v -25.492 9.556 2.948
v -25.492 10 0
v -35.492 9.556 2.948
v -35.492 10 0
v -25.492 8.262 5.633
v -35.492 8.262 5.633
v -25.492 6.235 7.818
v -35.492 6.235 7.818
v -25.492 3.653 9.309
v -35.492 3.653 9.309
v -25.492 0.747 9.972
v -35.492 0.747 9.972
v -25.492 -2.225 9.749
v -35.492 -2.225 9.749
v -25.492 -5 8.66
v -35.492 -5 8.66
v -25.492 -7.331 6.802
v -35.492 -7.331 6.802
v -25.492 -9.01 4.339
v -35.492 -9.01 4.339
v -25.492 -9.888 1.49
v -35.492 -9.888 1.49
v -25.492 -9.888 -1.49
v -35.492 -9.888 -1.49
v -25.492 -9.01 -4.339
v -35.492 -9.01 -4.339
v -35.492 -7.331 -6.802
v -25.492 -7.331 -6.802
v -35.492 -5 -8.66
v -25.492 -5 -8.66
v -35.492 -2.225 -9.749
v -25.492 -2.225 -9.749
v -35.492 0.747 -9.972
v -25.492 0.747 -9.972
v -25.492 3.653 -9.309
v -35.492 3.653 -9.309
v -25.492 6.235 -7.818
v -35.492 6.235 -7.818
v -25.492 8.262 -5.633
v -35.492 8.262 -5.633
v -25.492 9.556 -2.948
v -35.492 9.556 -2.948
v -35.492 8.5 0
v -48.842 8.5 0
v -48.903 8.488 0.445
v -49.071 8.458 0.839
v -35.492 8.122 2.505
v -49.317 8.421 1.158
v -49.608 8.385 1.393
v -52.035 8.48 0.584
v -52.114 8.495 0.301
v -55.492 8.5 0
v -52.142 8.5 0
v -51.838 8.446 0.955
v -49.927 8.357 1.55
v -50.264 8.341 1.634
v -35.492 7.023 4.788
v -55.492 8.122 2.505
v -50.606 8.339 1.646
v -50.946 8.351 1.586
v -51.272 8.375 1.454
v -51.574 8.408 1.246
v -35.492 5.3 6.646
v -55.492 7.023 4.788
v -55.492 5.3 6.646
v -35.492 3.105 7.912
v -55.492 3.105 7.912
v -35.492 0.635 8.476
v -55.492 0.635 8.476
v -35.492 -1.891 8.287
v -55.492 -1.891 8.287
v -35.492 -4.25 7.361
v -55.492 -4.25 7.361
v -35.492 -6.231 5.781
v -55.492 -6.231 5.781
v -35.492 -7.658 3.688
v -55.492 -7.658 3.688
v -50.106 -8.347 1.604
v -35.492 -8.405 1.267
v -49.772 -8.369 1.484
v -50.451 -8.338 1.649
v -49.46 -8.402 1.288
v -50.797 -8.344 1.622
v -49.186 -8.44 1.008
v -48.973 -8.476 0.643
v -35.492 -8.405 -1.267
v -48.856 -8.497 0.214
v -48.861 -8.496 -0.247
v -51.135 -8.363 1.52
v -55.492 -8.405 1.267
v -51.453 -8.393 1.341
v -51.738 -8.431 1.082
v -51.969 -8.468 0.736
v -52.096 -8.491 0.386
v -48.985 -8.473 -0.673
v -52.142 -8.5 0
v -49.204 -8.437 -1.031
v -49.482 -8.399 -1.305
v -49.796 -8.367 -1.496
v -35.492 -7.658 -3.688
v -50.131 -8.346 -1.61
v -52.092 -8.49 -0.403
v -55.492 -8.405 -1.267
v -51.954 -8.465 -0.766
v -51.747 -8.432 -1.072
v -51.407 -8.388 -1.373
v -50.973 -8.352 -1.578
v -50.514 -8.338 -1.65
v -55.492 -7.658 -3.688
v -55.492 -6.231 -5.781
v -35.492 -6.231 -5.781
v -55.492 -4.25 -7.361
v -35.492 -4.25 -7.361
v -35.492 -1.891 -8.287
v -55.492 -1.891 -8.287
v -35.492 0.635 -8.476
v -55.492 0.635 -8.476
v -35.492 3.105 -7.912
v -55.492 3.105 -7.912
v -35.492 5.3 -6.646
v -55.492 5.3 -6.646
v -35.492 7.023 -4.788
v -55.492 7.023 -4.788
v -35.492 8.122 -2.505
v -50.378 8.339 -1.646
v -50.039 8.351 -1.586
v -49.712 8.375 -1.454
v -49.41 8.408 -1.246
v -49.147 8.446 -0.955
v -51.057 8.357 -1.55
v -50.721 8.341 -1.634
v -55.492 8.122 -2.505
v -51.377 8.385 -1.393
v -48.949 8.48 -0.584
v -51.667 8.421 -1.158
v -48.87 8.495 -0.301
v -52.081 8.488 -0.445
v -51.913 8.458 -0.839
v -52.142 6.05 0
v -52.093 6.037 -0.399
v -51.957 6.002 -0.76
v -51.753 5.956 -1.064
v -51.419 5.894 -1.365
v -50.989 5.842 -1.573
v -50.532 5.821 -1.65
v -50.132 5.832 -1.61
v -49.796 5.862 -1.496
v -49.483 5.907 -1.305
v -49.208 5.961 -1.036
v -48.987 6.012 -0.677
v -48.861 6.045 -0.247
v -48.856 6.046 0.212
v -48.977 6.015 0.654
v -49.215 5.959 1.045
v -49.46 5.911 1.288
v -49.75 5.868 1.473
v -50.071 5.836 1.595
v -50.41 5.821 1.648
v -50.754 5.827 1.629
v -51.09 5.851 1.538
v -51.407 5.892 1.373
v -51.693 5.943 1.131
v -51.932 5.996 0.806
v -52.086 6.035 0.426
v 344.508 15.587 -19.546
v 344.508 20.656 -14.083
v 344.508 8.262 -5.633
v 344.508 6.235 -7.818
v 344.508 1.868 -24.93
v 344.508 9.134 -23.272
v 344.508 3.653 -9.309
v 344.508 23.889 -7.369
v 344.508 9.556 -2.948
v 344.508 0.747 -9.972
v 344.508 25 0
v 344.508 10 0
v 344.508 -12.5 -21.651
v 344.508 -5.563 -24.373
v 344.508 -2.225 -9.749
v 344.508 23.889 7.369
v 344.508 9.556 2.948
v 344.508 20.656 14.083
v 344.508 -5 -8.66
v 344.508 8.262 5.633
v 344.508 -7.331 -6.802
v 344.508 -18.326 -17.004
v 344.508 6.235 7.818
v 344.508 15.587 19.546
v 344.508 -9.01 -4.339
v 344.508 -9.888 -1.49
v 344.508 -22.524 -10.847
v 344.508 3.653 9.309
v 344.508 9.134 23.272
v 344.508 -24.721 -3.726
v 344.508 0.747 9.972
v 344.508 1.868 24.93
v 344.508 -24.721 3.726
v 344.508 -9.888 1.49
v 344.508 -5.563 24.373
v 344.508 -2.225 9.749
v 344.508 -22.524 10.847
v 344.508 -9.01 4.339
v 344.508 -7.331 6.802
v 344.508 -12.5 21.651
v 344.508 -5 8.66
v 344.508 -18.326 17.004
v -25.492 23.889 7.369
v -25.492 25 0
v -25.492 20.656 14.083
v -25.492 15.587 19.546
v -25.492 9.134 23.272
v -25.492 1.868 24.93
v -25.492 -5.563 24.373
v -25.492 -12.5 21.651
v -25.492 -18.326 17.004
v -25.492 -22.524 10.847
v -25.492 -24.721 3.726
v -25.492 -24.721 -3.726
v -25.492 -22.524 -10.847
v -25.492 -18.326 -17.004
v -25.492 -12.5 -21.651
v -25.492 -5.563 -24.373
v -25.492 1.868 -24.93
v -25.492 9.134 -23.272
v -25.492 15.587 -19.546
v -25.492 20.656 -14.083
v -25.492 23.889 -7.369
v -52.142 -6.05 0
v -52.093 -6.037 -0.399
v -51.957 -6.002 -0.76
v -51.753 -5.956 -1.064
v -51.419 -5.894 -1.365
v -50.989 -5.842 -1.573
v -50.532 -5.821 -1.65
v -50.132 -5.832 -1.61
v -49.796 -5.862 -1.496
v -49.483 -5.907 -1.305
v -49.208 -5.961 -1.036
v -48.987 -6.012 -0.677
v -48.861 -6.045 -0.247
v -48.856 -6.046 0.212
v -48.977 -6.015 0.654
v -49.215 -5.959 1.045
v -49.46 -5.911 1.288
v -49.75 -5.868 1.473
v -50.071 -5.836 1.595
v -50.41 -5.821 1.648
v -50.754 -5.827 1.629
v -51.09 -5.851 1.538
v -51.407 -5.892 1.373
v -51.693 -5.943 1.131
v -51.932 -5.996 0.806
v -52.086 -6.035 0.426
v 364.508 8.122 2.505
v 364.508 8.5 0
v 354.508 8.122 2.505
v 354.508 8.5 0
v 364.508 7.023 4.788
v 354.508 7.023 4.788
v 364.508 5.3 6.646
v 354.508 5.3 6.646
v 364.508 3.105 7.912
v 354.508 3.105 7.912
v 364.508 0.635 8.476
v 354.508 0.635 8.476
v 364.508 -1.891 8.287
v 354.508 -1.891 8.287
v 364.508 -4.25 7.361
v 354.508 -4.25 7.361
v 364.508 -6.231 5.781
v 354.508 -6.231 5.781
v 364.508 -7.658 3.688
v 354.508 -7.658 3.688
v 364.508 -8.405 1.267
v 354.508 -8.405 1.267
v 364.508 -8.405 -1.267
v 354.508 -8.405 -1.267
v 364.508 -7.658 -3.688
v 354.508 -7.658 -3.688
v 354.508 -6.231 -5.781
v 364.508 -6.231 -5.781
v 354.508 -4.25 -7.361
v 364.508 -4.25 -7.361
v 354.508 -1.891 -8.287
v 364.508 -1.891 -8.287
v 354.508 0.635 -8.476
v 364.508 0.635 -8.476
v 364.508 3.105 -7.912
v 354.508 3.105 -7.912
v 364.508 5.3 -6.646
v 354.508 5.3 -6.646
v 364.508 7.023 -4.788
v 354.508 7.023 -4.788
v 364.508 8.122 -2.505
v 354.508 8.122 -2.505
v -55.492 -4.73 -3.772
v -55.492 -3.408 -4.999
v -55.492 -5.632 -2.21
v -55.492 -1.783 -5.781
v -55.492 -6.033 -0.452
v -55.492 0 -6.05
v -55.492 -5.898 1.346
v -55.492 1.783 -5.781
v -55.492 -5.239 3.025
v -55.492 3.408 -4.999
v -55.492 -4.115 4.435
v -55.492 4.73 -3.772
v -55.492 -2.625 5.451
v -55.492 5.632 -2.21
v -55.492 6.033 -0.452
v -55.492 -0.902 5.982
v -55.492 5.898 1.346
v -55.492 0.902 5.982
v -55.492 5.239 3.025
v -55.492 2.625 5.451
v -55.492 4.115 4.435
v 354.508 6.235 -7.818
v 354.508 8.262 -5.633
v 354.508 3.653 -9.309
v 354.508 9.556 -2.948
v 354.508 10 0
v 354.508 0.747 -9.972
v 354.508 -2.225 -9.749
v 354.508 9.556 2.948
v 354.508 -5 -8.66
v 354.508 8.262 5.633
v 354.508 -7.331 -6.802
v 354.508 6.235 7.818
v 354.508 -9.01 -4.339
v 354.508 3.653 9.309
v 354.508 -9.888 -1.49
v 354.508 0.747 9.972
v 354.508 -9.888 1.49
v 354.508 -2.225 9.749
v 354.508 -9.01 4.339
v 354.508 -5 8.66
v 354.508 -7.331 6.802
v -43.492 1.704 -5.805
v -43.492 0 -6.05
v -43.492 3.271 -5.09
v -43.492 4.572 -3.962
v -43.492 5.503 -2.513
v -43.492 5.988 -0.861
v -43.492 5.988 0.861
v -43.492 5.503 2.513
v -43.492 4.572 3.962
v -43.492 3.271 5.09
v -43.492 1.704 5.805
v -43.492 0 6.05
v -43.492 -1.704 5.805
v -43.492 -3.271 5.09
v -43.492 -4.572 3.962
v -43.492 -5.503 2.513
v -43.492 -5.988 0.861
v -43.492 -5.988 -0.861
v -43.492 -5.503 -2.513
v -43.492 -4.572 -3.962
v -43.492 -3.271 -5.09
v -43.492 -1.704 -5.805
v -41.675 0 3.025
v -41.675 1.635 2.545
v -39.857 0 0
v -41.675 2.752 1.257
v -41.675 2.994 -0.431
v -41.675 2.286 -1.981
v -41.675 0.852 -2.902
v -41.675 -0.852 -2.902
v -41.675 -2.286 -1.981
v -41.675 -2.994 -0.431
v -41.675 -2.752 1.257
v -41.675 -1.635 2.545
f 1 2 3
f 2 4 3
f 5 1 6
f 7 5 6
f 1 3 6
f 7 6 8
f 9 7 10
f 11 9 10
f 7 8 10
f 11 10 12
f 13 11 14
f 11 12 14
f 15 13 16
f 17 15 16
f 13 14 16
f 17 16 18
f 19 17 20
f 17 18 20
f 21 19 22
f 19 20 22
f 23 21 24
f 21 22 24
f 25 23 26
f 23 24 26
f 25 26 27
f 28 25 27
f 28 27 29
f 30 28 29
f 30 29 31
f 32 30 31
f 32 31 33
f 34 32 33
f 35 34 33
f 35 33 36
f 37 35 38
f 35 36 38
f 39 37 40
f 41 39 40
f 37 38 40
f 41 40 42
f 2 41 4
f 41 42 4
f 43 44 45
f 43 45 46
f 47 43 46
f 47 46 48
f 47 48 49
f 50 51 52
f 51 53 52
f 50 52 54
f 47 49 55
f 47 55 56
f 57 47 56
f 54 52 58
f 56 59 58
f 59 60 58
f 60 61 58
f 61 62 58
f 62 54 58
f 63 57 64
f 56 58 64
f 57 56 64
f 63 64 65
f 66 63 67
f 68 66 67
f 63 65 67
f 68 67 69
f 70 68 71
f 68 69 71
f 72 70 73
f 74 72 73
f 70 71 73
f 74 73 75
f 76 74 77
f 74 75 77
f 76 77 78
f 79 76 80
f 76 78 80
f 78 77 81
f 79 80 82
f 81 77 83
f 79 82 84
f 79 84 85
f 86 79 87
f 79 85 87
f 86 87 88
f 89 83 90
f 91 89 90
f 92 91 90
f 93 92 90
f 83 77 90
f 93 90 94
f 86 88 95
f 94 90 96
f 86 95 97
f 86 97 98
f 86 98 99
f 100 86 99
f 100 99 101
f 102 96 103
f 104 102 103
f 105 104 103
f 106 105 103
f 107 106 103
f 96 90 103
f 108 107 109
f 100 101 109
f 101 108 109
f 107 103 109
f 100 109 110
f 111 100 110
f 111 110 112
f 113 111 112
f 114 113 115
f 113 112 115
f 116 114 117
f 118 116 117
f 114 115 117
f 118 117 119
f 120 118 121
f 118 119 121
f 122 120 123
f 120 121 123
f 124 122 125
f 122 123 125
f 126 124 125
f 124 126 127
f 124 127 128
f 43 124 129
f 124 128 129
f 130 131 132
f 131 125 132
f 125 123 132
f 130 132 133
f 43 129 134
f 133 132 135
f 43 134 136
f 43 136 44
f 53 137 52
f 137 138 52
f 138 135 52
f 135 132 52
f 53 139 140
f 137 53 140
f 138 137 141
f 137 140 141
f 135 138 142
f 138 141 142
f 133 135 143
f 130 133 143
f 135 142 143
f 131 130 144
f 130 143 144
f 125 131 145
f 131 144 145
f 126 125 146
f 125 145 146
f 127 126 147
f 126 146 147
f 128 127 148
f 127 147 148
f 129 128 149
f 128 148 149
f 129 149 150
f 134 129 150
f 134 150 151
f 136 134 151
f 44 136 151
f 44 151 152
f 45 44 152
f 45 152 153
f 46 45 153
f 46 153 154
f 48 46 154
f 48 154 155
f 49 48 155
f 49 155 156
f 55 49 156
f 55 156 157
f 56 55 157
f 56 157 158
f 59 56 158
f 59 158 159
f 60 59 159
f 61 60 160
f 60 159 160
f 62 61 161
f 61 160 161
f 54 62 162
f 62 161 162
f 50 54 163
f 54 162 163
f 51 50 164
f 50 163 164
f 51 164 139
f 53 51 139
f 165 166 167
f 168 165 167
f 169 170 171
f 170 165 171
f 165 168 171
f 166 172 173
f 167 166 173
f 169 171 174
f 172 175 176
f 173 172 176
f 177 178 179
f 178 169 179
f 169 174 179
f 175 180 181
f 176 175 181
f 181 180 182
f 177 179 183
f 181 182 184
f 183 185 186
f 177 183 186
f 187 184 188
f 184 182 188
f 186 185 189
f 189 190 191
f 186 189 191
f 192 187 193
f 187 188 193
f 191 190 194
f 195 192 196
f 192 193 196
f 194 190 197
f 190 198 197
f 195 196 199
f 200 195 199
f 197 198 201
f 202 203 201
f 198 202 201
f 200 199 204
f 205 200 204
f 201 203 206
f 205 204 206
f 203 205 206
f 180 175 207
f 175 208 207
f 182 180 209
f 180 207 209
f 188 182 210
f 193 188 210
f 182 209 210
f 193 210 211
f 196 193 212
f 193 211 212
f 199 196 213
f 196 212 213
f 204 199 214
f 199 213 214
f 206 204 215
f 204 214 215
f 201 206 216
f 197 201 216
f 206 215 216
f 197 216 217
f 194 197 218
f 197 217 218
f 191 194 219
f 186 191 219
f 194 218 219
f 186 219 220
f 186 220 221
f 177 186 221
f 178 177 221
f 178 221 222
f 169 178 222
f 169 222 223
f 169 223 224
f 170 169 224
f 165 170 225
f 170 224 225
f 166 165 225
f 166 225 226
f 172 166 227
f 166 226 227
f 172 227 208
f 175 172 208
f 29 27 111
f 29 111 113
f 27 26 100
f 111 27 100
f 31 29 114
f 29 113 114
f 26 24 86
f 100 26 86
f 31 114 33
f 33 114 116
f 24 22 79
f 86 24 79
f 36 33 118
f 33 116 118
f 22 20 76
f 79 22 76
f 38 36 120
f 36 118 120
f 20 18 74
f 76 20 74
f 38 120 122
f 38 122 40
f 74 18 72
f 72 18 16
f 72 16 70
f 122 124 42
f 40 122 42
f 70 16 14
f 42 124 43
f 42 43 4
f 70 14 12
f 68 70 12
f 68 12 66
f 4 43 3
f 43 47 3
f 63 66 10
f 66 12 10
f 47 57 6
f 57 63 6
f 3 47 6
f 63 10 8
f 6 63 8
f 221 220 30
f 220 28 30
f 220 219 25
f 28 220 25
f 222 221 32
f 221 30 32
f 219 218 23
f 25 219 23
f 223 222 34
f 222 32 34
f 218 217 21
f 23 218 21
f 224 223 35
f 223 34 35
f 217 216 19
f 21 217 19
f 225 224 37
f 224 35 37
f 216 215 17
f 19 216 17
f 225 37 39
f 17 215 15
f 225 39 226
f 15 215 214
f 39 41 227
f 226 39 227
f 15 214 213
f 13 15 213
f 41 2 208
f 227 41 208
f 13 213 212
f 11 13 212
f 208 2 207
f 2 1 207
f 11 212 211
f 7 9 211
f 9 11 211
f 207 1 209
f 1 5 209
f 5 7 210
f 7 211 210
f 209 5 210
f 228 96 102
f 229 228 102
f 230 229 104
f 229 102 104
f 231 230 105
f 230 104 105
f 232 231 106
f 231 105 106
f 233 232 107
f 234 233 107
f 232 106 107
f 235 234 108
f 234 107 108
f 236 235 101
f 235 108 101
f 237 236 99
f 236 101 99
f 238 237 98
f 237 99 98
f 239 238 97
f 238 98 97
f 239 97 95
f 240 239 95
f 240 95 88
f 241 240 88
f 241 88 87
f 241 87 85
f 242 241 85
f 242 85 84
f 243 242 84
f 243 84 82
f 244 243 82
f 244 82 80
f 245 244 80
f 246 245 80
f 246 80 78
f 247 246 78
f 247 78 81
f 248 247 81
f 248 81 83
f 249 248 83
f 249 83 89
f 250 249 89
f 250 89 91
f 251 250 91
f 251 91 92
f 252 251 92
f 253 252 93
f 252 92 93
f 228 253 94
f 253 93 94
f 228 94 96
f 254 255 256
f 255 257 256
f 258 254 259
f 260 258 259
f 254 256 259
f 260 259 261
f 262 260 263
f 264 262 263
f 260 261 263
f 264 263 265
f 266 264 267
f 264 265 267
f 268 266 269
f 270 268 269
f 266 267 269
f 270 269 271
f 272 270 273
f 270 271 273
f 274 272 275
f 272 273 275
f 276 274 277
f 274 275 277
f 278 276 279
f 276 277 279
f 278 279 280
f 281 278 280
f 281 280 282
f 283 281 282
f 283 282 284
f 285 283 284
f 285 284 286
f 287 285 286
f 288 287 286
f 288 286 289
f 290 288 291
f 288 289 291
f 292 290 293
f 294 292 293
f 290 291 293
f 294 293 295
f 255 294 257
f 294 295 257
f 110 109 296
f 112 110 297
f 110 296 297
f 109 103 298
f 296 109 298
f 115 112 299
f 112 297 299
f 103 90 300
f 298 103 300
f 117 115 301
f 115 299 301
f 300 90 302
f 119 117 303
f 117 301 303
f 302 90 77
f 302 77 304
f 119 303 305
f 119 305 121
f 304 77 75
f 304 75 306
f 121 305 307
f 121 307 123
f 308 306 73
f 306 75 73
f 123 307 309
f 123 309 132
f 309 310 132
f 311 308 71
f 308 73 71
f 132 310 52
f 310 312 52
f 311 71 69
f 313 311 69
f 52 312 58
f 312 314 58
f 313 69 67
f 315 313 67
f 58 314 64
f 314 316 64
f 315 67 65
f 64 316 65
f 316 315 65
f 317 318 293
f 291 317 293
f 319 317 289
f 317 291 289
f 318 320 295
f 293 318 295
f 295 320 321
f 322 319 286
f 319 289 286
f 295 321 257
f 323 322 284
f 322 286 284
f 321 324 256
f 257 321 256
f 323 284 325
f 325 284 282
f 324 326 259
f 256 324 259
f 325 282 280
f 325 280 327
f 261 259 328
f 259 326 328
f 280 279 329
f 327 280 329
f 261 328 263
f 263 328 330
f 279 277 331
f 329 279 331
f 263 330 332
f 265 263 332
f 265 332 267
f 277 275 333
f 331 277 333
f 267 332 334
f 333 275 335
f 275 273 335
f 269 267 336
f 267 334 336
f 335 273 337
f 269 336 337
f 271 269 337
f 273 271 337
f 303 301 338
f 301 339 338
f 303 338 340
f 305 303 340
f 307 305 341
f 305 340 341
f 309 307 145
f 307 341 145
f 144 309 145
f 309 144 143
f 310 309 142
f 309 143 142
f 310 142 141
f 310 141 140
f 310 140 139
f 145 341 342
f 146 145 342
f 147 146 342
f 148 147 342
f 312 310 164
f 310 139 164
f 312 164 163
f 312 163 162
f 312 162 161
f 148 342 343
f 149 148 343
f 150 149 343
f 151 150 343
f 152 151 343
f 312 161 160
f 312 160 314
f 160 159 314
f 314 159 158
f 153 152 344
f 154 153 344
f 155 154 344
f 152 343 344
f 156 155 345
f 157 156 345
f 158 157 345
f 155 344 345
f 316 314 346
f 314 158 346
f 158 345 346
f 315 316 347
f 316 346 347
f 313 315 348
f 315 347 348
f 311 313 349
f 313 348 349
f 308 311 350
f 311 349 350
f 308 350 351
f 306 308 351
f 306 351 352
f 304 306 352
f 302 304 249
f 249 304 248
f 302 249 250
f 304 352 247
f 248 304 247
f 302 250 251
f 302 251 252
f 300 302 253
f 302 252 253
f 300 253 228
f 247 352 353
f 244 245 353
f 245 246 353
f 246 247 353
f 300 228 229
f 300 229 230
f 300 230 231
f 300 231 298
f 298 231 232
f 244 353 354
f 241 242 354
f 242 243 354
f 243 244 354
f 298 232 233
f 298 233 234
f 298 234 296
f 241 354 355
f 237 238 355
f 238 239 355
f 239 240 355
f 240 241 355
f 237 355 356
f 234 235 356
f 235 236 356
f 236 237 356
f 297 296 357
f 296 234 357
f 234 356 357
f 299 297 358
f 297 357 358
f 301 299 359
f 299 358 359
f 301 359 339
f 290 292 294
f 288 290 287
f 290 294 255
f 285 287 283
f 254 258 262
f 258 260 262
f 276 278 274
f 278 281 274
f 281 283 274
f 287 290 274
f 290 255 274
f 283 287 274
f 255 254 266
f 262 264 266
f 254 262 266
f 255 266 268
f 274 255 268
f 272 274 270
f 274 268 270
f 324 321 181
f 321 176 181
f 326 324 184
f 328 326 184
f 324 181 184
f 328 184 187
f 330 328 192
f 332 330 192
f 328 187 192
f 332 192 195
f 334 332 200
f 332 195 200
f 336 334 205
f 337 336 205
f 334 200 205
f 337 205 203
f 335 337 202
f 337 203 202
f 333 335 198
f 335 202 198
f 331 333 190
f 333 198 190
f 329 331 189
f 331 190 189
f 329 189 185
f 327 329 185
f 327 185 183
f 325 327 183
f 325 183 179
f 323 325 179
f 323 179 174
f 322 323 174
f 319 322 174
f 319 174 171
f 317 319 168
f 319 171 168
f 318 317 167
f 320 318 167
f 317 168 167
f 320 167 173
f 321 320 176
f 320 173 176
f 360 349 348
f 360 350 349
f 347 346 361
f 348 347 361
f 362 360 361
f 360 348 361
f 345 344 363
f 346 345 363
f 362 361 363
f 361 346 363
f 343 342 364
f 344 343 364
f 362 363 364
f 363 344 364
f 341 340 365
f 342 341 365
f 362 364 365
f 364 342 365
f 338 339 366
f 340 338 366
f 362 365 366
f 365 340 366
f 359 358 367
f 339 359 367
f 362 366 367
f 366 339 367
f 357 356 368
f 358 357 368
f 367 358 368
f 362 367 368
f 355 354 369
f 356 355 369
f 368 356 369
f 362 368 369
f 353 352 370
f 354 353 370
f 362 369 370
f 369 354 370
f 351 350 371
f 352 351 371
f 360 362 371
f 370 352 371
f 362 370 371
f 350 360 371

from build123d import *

# Parameters (mm, degrees)
HOLE_WIZARD_M4_1_D     = 3.3
HOLE_WIZARD_M4_1_DEPTH = 20
HOLE_WIZARD_M4_1_TIP   = 0.991420021
MM_CLEARANCE_1_D       = 12.1
MM_CLEARANCE_1_DEPTH   = 12
MM_CLEARANCE_1_TIP     = 3.635206745


with BuildPart() as part:
    # 草图2 → 旋转1 (revolve)
    with BuildSketch(Plane.XY):
        Polygon((354.507854502, 10), (344.507854502, 10), (344.507854502, 25), (-25.492145498, 25), (-25.492145498, 10), (-35.492145498, 10), (-35.492145498, 8.5), (-45.492145498, 8.5), (-55.492145498, 8.5), (-55.492145498, 0), (-39.793794406, 0), (364.507854502, 0), (364.507854502, 8.5), (354.507854502, 8.5), align=None)
    revolve(axis=Axis((-62.705882353, 0, 0), (1, 0, 0)))

    # M4 螺纹孔1
    with Locations(Plane(origin=(0, 8.5, 0), x_dir=(1, 0, 0), z_dir=(0, 1, 0))):
        with Locations((-50.492145498, 0)):
            Hole(HOLE_WIZARD_M4_1_D / 2, depth=HOLE_WIZARD_M4_1_DEPTH)
            with Locations((0, 0, -(HOLE_WIZARD_M4_1_DEPTH + HOLE_WIZARD_M4_1_TIP / 2))):  # 118° drill point
                Cone(0, HOLE_WIZARD_M4_1_D / 2, HOLE_WIZARD_M4_1_TIP, mode=Mode.SUBTRACT)

    # 大小mm Clearance 暗销孔1
    with Locations(Plane.ZY.offset(55.492145498)):
        with Locations((0, 0)):
            Hole(MM_CLEARANCE_1_D / 2, depth=MM_CLEARANCE_1_DEPTH)
            with Locations((0, 0, -(MM_CLEARANCE_1_DEPTH + MM_CLEARANCE_1_TIP / 2))):  # 118° drill point
                Cone(0, MM_CLEARANCE_1_D / 2, MM_CLEARANCE_1_TIP, mode=Mode.SUBTRACT)


solid = part.part
